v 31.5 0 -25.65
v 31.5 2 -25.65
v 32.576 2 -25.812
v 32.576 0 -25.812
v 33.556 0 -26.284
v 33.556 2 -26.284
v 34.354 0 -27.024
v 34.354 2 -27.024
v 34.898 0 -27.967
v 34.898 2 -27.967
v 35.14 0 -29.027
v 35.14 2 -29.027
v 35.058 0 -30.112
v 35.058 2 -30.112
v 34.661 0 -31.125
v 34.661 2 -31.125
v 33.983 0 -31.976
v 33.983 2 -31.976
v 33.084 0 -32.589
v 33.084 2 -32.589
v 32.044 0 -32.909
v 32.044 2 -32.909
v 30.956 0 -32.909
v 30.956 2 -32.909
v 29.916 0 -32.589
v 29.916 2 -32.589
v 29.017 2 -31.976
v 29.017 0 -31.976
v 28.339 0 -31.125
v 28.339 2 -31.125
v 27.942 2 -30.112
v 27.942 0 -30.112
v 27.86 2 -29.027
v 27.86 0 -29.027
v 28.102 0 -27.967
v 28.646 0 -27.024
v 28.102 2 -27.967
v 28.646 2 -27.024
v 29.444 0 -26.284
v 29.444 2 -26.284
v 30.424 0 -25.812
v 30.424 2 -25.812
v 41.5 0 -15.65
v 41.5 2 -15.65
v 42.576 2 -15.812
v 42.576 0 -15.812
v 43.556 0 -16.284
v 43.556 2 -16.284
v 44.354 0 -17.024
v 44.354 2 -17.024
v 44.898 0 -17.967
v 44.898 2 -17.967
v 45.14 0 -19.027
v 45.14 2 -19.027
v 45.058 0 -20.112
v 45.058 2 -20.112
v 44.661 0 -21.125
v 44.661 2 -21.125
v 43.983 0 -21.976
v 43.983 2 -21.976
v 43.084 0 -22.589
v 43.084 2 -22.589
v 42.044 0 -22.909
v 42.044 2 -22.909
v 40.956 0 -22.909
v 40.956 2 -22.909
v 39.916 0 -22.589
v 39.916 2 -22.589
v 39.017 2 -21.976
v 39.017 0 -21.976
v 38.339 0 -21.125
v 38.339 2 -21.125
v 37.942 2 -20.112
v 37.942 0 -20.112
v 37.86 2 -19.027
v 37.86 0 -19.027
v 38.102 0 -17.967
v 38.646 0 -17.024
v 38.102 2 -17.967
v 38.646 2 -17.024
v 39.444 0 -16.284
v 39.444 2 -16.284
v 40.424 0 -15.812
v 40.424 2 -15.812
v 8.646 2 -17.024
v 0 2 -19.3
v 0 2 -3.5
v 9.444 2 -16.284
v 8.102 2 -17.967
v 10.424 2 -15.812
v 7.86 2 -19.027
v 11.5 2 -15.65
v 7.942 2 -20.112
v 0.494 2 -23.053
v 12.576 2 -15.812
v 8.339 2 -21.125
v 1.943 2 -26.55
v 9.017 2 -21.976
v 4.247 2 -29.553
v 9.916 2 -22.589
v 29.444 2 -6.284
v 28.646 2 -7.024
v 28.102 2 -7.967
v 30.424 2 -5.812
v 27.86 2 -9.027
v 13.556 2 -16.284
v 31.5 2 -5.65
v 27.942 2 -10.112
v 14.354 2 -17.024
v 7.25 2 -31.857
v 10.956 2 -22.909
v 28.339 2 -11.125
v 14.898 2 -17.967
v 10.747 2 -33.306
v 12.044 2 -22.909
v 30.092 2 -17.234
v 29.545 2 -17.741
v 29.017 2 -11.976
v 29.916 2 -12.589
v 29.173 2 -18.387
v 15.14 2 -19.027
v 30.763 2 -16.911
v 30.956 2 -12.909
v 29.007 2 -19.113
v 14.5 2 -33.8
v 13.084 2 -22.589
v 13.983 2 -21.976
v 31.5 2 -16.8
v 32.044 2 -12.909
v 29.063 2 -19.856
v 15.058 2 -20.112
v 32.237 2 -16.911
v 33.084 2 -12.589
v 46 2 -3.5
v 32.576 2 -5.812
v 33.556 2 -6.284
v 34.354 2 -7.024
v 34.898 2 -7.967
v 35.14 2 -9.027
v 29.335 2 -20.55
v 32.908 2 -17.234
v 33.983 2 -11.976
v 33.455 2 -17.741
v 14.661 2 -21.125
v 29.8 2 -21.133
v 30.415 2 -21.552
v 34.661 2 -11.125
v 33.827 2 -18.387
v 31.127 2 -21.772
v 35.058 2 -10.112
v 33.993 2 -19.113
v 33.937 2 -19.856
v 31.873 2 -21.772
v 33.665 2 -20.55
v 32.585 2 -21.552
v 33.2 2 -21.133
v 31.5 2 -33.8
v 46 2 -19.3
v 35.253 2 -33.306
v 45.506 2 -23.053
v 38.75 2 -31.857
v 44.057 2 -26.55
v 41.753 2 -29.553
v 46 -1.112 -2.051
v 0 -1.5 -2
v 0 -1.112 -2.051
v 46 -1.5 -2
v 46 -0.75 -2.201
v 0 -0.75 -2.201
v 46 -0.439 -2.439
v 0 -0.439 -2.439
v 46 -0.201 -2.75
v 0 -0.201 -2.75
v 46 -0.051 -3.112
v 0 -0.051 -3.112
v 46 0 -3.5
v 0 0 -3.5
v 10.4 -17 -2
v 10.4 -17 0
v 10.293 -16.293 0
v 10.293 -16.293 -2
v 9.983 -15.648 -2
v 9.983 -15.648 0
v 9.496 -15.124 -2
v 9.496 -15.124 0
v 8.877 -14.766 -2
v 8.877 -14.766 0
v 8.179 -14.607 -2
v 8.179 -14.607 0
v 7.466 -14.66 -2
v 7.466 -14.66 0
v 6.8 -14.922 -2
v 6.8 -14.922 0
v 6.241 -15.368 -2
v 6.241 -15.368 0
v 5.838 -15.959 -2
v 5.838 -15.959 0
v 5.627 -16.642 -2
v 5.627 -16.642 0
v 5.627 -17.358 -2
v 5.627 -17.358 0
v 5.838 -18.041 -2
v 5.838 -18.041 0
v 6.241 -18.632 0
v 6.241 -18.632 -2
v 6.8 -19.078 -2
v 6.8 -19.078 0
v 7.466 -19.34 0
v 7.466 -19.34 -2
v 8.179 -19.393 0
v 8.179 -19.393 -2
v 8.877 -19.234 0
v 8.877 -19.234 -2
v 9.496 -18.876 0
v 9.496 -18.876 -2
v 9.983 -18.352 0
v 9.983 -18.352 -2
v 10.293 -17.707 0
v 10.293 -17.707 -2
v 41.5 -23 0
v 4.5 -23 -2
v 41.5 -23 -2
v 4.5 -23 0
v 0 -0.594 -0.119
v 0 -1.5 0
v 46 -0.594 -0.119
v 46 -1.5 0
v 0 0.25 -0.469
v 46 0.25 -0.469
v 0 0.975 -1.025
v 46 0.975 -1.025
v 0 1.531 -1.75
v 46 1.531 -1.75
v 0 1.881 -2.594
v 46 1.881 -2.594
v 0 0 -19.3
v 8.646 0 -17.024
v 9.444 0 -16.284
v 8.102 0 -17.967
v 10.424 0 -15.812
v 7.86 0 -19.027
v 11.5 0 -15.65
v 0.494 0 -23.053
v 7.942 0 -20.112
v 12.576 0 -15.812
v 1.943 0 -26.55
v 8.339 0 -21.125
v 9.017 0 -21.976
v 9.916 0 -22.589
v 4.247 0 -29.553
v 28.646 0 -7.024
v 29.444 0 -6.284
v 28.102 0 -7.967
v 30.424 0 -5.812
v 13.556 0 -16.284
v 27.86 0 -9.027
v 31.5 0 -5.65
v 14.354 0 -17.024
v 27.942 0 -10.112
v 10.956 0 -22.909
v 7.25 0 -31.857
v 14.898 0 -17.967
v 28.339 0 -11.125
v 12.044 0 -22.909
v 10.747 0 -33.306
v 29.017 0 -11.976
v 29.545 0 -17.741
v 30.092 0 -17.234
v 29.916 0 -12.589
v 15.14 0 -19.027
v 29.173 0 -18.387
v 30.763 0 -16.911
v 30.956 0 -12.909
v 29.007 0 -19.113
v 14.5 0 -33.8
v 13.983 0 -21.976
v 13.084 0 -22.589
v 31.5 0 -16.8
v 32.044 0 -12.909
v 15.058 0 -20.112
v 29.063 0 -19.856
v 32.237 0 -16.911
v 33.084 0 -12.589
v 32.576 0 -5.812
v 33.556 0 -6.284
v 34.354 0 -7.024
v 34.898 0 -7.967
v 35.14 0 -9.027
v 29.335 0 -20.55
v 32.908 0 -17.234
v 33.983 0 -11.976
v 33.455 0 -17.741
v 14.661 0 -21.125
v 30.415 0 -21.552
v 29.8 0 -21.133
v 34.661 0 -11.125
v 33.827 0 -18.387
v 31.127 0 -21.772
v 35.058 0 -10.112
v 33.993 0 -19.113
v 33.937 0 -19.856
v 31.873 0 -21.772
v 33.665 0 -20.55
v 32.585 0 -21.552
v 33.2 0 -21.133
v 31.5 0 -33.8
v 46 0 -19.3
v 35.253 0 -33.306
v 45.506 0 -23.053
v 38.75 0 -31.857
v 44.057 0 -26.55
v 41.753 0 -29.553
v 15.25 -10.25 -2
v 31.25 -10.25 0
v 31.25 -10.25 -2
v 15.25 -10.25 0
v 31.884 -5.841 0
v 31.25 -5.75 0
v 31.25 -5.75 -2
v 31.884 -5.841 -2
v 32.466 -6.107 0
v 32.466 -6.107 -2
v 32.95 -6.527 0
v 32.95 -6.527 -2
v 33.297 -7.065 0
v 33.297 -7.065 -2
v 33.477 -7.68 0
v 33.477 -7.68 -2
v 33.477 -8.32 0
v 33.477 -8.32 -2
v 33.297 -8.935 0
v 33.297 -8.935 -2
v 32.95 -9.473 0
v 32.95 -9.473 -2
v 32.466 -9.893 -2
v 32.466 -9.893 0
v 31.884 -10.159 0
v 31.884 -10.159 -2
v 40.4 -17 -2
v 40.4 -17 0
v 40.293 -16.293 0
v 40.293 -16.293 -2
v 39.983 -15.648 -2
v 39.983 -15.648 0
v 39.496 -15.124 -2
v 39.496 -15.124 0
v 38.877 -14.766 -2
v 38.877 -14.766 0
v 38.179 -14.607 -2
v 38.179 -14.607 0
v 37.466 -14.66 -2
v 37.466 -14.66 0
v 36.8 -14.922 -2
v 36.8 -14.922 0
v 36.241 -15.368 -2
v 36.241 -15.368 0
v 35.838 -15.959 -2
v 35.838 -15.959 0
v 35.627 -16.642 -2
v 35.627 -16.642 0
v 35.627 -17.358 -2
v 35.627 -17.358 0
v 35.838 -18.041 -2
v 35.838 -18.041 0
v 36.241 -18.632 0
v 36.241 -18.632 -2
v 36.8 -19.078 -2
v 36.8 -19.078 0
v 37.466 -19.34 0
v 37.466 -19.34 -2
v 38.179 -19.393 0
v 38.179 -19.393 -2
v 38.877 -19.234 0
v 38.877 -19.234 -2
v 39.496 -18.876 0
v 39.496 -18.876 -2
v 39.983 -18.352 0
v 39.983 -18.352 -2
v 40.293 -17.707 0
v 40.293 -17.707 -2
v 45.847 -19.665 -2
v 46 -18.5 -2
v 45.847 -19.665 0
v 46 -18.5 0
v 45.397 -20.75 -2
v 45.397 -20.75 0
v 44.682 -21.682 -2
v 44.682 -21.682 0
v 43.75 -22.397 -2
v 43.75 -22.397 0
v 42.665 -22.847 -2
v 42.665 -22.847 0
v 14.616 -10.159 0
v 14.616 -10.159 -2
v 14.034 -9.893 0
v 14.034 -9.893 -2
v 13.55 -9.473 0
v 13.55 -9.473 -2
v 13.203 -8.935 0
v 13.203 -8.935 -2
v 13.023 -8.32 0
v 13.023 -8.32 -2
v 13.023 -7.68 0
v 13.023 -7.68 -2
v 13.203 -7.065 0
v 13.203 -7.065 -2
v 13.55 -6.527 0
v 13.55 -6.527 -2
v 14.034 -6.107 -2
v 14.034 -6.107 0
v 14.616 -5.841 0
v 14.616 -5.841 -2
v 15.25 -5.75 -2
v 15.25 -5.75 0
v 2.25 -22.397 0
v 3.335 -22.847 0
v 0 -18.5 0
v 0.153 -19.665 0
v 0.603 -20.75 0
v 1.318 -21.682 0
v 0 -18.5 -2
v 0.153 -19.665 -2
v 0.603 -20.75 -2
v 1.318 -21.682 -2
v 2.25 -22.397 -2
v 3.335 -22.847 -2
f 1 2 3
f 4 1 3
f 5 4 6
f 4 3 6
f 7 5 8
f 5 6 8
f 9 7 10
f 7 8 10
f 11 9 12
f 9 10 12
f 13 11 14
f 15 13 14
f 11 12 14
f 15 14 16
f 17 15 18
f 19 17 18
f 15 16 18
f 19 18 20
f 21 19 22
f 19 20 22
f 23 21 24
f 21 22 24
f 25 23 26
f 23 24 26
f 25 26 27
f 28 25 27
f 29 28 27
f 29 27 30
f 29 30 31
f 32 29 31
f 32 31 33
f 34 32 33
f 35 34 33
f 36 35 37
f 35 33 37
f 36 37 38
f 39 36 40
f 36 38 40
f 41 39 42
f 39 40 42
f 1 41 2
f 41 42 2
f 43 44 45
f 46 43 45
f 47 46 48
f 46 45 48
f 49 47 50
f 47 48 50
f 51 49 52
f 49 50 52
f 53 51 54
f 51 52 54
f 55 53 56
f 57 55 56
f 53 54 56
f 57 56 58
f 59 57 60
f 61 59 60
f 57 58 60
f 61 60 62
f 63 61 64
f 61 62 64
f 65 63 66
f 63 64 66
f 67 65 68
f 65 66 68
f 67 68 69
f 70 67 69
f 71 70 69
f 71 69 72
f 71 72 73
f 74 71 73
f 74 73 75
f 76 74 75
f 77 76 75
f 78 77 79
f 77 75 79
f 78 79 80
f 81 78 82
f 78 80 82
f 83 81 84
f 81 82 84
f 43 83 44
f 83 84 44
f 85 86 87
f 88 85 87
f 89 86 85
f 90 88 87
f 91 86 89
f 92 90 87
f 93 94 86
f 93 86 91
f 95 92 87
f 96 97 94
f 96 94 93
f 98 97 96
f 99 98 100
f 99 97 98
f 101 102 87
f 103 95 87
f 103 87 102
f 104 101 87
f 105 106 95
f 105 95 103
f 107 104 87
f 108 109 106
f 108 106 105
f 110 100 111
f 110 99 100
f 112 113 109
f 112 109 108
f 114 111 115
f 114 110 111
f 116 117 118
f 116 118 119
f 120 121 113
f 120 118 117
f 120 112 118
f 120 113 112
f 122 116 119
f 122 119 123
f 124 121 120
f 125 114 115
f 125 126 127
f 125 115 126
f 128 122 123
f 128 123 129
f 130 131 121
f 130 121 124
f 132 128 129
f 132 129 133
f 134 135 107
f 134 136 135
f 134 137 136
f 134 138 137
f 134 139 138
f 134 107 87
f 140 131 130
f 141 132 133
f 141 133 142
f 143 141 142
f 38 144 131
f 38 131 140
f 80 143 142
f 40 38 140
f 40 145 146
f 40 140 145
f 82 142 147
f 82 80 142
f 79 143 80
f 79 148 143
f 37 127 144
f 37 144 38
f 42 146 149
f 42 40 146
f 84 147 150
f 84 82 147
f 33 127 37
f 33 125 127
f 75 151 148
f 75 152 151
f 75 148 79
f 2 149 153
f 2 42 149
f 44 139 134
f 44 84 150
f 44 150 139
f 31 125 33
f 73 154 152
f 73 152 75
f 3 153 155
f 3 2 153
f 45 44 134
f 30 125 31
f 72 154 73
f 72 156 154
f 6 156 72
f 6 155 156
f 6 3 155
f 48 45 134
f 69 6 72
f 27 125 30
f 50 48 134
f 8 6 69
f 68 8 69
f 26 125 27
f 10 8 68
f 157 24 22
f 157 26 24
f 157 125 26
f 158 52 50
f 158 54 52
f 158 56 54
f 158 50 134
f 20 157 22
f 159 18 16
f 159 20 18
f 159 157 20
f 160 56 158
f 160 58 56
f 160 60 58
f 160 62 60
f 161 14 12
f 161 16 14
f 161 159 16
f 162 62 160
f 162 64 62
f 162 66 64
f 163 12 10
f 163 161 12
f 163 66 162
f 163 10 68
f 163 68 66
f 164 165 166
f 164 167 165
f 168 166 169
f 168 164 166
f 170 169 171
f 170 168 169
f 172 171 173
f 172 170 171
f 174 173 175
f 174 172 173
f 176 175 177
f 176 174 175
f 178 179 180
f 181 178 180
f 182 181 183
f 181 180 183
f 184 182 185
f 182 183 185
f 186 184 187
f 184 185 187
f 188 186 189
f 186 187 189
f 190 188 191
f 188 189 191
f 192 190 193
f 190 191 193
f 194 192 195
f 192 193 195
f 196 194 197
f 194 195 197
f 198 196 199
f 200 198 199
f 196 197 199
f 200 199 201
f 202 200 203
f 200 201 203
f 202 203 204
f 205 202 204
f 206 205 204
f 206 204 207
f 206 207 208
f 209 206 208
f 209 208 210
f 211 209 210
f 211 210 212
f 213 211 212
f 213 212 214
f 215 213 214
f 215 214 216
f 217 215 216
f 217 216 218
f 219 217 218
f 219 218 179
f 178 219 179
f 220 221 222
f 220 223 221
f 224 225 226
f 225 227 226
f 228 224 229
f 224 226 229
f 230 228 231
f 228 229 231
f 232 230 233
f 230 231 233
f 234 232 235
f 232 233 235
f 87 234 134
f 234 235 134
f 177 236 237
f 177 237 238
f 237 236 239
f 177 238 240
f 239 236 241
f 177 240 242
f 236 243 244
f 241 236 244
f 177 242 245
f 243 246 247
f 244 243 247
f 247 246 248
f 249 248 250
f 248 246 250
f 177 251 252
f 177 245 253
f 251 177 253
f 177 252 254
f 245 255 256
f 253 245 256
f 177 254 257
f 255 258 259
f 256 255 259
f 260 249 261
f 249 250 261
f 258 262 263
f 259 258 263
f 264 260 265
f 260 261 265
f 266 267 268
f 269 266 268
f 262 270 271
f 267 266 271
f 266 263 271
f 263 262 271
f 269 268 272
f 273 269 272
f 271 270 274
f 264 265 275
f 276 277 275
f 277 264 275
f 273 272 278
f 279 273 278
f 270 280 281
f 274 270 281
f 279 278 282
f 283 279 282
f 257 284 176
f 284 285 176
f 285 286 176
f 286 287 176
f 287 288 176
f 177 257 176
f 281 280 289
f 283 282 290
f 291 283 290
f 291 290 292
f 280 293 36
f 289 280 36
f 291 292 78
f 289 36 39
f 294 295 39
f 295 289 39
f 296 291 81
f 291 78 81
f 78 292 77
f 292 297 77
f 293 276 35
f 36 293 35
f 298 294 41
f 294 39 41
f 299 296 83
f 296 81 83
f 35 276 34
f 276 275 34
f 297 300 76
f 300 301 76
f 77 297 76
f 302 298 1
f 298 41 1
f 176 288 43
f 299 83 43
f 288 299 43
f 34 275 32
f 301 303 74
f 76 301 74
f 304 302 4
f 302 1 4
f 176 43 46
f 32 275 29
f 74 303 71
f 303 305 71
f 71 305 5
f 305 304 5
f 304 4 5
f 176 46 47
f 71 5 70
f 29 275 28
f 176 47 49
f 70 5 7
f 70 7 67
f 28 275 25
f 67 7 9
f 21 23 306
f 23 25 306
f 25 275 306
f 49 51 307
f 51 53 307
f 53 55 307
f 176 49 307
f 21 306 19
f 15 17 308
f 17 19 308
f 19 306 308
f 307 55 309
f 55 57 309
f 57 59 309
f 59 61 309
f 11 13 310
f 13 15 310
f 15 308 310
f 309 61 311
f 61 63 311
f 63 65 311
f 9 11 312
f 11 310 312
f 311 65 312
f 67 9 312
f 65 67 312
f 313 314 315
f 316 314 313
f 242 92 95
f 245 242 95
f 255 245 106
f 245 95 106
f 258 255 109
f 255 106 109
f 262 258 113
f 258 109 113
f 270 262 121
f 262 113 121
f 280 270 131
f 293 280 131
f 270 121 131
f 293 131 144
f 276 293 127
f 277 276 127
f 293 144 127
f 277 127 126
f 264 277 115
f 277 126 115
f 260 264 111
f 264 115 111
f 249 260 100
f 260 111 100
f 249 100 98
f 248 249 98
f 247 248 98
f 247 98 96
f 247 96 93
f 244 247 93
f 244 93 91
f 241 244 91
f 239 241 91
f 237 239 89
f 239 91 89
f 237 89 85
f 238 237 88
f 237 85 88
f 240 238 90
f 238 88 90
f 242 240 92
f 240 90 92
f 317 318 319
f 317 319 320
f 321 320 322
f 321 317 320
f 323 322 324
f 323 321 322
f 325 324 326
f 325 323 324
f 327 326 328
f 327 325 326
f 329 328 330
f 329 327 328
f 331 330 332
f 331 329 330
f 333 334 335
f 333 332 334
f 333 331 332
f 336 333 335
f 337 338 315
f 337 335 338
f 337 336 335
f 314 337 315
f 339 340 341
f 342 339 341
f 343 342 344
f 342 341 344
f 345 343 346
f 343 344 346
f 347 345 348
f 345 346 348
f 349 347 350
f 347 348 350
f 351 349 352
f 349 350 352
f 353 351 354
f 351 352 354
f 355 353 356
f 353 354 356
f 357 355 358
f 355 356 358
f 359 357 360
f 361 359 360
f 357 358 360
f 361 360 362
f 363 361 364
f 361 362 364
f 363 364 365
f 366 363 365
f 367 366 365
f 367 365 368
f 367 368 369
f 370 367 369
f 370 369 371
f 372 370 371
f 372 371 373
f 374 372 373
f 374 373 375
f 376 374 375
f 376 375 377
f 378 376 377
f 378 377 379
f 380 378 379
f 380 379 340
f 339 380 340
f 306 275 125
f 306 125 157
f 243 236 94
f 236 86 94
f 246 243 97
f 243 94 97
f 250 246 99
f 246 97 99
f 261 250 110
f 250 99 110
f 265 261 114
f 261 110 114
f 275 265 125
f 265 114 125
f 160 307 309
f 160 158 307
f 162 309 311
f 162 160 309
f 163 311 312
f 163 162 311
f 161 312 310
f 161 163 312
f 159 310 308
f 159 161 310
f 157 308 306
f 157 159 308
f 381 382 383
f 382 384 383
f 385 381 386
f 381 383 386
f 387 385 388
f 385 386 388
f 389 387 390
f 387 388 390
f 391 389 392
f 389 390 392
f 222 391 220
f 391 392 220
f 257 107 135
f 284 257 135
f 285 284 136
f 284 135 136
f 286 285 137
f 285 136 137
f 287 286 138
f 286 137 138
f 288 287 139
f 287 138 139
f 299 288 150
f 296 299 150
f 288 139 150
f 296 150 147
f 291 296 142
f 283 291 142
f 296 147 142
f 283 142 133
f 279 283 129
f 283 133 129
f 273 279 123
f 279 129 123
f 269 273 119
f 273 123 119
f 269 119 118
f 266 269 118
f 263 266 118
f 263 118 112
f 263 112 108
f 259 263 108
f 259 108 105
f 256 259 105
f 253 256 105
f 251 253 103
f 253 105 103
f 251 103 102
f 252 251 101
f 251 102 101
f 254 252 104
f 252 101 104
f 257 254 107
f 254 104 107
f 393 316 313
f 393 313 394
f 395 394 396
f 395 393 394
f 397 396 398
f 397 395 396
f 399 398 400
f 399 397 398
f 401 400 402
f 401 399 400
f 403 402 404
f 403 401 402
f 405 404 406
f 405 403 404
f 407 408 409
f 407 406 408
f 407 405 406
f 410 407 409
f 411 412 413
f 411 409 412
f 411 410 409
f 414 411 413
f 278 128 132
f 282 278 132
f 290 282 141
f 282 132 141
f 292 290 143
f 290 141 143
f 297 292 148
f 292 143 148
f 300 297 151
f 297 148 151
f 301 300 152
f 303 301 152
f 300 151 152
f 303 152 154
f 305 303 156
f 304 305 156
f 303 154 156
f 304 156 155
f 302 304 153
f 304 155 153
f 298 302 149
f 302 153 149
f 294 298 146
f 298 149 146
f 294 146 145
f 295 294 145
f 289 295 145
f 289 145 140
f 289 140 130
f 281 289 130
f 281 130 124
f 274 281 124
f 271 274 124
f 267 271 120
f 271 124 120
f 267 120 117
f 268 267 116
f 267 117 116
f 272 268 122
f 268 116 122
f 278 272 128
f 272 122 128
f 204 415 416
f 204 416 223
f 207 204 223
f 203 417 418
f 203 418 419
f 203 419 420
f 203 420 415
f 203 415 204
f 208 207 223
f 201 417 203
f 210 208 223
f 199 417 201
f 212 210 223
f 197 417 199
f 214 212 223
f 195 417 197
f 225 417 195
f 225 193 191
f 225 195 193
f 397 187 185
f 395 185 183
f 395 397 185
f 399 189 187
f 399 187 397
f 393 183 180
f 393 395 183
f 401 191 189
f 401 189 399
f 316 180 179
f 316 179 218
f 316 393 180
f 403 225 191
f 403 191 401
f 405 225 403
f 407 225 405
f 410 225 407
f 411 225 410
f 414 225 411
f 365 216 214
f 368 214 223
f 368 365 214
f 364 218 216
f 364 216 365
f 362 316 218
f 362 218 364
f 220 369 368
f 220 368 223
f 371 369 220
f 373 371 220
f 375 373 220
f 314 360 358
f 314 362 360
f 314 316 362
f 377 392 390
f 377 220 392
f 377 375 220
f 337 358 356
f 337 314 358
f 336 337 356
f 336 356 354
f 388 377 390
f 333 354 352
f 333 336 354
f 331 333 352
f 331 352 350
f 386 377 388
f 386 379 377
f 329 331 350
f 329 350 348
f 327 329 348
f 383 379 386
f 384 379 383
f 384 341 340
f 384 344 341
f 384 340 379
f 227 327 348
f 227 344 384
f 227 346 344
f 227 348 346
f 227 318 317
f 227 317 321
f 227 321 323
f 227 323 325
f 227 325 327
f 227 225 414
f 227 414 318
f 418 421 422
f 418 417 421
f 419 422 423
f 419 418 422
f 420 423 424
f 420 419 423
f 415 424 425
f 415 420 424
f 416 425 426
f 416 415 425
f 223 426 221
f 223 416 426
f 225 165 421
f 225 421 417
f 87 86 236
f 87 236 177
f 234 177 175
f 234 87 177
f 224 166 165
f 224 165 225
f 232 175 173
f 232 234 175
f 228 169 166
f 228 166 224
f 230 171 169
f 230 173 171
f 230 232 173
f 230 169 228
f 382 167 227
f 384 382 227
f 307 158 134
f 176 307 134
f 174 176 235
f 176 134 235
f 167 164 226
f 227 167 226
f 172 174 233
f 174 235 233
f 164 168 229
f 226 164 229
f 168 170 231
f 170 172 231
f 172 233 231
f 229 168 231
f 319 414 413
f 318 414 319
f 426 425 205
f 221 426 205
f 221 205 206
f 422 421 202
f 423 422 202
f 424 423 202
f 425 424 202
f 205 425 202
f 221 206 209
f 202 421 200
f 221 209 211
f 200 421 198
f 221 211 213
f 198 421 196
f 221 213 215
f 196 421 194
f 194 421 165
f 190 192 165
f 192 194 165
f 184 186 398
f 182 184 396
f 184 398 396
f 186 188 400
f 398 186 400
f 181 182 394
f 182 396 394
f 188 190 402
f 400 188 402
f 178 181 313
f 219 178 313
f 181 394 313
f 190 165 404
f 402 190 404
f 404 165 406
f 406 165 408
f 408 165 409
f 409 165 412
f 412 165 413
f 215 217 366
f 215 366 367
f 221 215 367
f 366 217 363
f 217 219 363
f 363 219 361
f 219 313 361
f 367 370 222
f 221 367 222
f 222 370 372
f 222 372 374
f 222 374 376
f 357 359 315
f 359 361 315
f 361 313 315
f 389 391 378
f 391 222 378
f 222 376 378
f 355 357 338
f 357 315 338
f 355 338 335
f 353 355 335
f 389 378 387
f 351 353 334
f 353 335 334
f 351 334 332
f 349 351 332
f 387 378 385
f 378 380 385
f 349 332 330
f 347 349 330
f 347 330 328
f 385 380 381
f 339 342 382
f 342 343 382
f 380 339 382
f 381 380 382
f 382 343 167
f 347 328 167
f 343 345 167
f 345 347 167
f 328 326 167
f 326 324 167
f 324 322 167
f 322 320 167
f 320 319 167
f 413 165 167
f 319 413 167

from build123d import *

# Parameters (mm, degrees)
SKETCH_3_W          = 46
SKETCH_3_H          = 33.8
EXTRUDE_1_DEPTH     = 2
FILLET_1_R          = 14.5
SKETCH_4_R          = 2.5
SKETCH_4_R_2        = 3.65
CUT_EXTRUDE_1_DEPTH = 2
SKETCH_5_W          = 46
SKETCH_5_H          = 2
EXTRUDE_2_DEPTH     = 23
FILLET_2_R          = 4.5
FILLET_3_R          = 3.5
FILLET_4_R          = 1.5
SKETCH_6_R          = 2.4
CUT_EXTRUDE_2_DEPTH = 25


with BuildPart() as part:
    # 草图3 → 凸台-拉伸1 (new body)
    with BuildSketch(Plane(origin=(0, 0, 0), x_dir=(1, 0, 0), z_dir=(0, 1, 0))):
        with Locations((23, 16.9)):
            Rectangle(SKETCH_3_W, SKETCH_3_H)
    extrude(amount=EXTRUDE_1_DEPTH)

    # 圆角1
    fillet_1_edges = [part.edges().sort_by_distance(p)[0] for p in [
        (0, 1, -33.8),
        (46, 1, -33.8),
    ]]
    fillet(fillet_1_edges, radius=FILLET_1_R)

    # 草图4 → 切除-拉伸1 (cut)
    with BuildSketch(Plane(origin=(0, 2, 0), x_dir=(1, 0, 0), z_dir=(0, 1, 0))):
        with Locations(Location((31.5, 19.3, 0), (0, 0, 270))):
            Circle(SKETCH_4_R)
        with Locations(Location((41.5, 19.3, 0), (0, 0, 270))):
            Circle(SKETCH_4_R_2)
        with Locations(Location((31.5, 29.3, 0), (0, 0, 270))):
            Circle(SKETCH_4_R_2)
        with Locations(Location((31.5, 9.3, 0), (0, 0, 270))):
            Circle(SKETCH_4_R_2)
        with Locations(Location((11.5, 19.3, 0), (0, 0, 270))):
            Circle(SKETCH_4_R_2)
    extrude(amount=-CUT_EXTRUDE_1_DEPTH, mode=Mode.SUBTRACT)

    # 草图5 → 凸台-拉伸2 (add)
    with BuildSketch(Plane.XZ):
        with Locations((23, -1)):
            Rectangle(SKETCH_5_W, SKETCH_5_H)
    extrude(amount=EXTRUDE_2_DEPTH)

    # 圆角2
    fillet_2_edges = [part.edges().sort_by_distance(p)[0] for p in [
        (0, -23, -1),
        (46, -23, -1),
    ]]
    fillet(fillet_2_edges, radius=FILLET_2_R)

    # 圆角3
    fillet_3_edges = [part.edges().sort_by_distance(p)[0] for p in [
        (23, 2, 0),
    ]]
    fillet(fillet_3_edges, radius=FILLET_3_R)

    # 圆角4
    fillet_4_edges = [part.edges().sort_by_distance(p)[0] for p in [
        (23, 0, -2),
    ]]
    fillet(fillet_4_edges, radius=FILLET_4_R)

    # 草图6 → 切除-拉伸2 (cut)
    with BuildSketch(Plane.XY):
        with Locations((8, -17)):
            Circle(SKETCH_6_R)
        with Locations((38, -17)):
            Circle(SKETCH_6_R)
        with BuildLine():
            Line((15.25, -5.75), (31.25, -5.75))
            ThreePointArc((31.25, -5.75), (33.5, -8), (31.25, -10.25))
            Line((31.25, -10.25), (15.25, -10.25))
            ThreePointArc((15.25, -10.25), (13, -8), (15.25, -5.75))
        make_face()
    extrude(amount=-CUT_EXTRUDE_2_DEPTH, mode=Mode.SUBTRACT)


solid = part.part
